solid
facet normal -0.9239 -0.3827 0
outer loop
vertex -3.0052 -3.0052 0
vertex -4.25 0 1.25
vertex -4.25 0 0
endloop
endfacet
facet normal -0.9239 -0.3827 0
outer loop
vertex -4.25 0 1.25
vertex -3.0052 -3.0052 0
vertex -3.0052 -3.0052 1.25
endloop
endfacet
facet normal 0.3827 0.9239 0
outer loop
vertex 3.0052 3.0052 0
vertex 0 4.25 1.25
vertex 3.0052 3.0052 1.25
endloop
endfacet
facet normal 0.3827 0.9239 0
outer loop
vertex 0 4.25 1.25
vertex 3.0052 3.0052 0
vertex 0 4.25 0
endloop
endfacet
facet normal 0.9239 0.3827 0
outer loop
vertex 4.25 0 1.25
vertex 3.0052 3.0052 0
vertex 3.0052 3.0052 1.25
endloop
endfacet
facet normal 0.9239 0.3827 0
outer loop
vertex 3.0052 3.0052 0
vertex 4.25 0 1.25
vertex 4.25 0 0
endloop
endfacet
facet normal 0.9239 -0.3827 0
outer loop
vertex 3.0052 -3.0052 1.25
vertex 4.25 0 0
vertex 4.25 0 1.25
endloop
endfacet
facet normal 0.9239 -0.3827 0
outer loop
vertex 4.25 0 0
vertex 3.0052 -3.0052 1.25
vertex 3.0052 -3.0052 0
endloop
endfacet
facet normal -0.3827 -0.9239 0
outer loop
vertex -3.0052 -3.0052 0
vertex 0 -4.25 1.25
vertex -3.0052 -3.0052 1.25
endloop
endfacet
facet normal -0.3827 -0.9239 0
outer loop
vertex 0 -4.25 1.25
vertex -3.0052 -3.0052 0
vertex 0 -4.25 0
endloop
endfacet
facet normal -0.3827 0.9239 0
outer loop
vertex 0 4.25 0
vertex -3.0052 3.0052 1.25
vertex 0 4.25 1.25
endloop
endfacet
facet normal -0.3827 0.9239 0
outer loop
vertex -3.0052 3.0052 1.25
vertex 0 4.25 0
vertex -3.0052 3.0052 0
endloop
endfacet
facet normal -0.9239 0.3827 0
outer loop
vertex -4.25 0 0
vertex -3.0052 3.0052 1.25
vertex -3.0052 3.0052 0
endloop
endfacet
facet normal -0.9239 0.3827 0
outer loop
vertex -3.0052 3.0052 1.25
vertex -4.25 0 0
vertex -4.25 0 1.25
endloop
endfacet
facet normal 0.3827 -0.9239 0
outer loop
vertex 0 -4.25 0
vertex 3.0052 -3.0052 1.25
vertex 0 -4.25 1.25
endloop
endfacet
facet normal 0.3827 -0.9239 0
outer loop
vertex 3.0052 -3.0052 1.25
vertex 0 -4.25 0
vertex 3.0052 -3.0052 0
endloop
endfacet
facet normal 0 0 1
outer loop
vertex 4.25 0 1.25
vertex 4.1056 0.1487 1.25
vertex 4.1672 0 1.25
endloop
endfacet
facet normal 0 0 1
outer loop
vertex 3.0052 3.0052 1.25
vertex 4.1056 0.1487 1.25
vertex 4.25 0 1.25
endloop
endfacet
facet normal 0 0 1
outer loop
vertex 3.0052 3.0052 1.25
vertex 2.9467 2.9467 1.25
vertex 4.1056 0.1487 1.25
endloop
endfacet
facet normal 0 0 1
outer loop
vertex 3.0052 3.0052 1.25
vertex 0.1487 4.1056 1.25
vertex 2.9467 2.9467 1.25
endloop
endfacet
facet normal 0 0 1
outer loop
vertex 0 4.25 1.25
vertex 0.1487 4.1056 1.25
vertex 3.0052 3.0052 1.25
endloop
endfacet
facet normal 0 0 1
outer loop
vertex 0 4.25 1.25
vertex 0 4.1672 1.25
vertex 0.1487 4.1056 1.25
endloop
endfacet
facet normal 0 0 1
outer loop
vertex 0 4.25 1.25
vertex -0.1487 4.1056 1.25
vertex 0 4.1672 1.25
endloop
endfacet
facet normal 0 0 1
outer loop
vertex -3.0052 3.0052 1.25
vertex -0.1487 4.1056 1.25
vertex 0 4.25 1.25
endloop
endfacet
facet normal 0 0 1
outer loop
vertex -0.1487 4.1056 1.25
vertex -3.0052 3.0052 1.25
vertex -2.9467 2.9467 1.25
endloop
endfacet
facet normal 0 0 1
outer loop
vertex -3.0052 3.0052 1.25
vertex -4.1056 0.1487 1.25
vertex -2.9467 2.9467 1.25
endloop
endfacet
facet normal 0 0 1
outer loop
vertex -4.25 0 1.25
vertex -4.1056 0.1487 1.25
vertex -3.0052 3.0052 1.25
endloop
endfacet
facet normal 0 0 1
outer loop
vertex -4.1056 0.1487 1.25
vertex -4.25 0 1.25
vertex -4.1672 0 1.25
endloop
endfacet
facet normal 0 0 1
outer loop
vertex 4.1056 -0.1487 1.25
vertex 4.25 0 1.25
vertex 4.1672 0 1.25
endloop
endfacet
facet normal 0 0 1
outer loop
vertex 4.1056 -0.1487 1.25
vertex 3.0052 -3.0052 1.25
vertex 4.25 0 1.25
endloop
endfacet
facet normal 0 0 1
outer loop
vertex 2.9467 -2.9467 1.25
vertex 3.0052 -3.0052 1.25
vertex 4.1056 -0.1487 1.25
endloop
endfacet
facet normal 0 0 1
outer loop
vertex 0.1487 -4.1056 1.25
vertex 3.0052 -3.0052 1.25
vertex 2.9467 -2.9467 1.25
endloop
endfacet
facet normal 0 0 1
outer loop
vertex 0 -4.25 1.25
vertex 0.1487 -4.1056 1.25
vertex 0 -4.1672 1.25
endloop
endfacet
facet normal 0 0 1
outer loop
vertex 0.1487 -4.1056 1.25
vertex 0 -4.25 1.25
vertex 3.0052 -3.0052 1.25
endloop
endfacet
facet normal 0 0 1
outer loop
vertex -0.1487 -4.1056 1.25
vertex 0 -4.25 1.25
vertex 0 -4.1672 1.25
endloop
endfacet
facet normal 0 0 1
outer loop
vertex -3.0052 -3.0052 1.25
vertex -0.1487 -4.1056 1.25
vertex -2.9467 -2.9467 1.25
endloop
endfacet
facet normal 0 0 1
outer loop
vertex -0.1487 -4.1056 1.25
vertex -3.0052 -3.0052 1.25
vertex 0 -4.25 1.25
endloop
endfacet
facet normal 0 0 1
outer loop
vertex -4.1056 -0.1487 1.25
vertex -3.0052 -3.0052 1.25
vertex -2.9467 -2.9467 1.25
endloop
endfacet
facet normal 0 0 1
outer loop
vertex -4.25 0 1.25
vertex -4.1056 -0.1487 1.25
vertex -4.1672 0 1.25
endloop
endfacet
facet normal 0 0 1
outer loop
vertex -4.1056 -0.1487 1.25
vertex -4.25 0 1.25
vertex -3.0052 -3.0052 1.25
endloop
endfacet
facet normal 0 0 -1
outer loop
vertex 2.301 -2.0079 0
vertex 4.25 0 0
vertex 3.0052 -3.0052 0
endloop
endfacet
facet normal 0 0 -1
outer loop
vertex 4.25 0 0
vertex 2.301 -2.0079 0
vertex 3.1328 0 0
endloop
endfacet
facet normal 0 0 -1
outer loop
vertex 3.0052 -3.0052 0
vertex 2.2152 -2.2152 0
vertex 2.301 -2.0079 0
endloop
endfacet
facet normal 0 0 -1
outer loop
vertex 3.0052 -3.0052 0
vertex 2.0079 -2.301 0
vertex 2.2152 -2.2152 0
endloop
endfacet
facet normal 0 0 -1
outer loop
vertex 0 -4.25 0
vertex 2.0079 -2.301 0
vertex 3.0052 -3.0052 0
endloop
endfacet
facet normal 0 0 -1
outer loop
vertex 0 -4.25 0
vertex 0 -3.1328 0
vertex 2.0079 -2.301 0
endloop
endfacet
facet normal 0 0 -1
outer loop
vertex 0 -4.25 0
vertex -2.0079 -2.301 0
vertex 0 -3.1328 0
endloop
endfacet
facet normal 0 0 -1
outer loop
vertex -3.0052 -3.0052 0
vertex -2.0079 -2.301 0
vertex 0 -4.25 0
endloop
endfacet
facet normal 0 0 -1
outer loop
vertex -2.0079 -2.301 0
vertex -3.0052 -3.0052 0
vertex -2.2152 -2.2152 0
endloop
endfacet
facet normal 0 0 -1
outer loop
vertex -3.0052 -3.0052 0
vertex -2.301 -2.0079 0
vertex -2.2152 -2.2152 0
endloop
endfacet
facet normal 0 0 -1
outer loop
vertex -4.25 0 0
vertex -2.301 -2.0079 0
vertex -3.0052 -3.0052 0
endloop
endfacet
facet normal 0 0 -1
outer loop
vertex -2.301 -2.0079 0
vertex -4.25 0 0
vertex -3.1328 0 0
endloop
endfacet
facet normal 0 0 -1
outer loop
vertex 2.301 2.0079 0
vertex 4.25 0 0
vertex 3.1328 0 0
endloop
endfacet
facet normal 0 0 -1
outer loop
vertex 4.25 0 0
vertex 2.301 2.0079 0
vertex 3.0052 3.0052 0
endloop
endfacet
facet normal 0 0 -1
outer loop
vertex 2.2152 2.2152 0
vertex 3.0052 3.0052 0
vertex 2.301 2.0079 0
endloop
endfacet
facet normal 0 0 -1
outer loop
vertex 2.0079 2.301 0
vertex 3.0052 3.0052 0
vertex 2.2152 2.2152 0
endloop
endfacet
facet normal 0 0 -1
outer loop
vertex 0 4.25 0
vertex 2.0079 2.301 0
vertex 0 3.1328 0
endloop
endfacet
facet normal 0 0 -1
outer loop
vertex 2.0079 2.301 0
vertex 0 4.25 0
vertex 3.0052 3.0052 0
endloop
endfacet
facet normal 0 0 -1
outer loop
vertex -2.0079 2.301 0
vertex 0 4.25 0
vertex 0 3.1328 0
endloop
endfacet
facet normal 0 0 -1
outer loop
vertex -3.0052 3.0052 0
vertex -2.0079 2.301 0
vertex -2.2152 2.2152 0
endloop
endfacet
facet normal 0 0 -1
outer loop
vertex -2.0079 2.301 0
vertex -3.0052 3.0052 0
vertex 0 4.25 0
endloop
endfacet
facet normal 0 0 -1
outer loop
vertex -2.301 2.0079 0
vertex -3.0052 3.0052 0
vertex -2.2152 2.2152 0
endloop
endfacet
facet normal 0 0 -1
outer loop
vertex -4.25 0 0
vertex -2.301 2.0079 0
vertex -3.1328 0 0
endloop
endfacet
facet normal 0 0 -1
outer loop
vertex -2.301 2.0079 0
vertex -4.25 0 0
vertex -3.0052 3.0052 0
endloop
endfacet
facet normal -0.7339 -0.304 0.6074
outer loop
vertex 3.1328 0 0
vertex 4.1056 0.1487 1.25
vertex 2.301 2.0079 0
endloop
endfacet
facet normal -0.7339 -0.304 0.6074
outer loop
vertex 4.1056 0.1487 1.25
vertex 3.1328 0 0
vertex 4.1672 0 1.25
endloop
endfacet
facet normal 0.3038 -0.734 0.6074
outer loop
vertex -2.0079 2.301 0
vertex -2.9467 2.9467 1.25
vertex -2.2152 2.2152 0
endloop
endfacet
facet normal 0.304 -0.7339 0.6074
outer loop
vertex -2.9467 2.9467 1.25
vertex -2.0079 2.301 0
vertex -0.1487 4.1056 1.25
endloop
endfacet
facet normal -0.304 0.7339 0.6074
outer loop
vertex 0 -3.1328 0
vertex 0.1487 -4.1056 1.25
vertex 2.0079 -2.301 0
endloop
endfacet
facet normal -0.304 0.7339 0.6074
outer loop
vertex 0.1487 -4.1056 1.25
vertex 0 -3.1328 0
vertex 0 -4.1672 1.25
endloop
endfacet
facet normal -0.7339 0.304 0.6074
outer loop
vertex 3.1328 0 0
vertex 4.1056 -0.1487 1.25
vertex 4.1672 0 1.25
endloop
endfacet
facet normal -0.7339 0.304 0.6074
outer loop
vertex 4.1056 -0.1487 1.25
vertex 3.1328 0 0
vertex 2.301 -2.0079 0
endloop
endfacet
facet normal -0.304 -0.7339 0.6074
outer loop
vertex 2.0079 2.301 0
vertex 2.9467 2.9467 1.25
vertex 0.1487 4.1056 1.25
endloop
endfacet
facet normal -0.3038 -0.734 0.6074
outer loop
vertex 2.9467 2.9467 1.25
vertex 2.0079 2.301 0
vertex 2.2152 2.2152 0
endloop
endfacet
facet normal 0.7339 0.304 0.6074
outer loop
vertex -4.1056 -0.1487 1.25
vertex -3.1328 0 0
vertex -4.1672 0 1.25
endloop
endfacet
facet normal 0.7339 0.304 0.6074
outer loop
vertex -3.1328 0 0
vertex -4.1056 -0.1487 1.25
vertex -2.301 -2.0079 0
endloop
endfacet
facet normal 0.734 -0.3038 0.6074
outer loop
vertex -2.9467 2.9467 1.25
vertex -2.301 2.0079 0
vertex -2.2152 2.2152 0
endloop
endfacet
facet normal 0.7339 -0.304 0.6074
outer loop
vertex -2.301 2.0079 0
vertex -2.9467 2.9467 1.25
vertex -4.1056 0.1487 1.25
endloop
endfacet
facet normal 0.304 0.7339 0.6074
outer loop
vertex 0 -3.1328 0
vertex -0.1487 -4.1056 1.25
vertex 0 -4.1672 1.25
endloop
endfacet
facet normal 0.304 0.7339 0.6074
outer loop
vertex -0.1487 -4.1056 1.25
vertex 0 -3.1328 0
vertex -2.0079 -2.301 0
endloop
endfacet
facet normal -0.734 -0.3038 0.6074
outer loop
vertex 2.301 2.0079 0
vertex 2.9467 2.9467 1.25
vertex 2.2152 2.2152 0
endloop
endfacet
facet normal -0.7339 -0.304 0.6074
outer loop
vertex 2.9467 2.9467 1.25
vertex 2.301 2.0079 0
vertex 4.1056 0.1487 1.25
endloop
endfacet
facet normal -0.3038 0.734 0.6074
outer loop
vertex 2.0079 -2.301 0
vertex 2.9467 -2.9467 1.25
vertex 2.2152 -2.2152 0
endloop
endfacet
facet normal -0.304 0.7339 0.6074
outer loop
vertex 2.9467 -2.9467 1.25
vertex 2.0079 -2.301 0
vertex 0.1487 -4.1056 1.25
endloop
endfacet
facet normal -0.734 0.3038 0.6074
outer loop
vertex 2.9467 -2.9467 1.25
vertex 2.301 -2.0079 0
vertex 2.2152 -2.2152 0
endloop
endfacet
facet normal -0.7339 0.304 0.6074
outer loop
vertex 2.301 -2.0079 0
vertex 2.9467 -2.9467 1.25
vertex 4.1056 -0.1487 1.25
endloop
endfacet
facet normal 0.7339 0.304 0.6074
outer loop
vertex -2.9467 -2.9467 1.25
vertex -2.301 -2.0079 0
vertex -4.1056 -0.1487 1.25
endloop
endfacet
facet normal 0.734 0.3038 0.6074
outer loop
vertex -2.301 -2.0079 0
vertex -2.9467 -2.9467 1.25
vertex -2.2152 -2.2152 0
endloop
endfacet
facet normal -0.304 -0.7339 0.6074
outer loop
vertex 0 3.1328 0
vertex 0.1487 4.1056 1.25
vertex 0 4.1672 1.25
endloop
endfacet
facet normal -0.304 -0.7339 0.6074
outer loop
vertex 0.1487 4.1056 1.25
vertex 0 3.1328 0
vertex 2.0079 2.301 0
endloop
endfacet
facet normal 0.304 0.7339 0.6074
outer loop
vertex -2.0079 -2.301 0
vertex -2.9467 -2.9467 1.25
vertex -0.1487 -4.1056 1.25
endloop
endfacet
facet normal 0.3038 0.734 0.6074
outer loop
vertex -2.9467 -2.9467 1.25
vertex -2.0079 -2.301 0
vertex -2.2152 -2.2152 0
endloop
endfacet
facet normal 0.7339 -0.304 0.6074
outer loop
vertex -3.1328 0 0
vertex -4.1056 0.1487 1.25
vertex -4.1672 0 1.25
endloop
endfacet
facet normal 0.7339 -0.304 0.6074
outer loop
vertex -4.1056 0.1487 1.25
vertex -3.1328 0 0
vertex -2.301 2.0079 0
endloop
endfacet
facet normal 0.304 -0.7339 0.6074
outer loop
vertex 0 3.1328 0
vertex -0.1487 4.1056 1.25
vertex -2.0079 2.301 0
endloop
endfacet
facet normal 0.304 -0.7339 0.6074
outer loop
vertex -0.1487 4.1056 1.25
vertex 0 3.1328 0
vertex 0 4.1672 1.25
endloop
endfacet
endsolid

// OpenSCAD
// created by IndiePandaaaaa|Lukas
// encoding: utf-8

TOLERANCE = .2;
$fn = 8; //$preview? 25:125;

STEM_OD = 5.9;
STEM_HEIGHT = 4.5;

// cherry activation point
CSILVER = 1.2;  // cherry mx silver
CRED = 2;  // cherry mx red
GPANDA = 2.5;  // glorious panda

// o-ring uncompressed thickness
RING_009 = 1.8;
GLORIOUS_A40_THIN = 1.5;

module travel_stop(activation_point, o_ring) {
  height = STEM_HEIGHT - activation_point - o_ring/2;
  translate([0, 0, height/2]) difference() {
    cylinder(d=8.5, h=height, center=true); 
    cylinder(d1=STEM_OD + TOLERANCE, d2=8.5, h=height + .2, center=true);
  }
}

travel_stop(GPANDA, GLORIOUS_A40_THIN);
